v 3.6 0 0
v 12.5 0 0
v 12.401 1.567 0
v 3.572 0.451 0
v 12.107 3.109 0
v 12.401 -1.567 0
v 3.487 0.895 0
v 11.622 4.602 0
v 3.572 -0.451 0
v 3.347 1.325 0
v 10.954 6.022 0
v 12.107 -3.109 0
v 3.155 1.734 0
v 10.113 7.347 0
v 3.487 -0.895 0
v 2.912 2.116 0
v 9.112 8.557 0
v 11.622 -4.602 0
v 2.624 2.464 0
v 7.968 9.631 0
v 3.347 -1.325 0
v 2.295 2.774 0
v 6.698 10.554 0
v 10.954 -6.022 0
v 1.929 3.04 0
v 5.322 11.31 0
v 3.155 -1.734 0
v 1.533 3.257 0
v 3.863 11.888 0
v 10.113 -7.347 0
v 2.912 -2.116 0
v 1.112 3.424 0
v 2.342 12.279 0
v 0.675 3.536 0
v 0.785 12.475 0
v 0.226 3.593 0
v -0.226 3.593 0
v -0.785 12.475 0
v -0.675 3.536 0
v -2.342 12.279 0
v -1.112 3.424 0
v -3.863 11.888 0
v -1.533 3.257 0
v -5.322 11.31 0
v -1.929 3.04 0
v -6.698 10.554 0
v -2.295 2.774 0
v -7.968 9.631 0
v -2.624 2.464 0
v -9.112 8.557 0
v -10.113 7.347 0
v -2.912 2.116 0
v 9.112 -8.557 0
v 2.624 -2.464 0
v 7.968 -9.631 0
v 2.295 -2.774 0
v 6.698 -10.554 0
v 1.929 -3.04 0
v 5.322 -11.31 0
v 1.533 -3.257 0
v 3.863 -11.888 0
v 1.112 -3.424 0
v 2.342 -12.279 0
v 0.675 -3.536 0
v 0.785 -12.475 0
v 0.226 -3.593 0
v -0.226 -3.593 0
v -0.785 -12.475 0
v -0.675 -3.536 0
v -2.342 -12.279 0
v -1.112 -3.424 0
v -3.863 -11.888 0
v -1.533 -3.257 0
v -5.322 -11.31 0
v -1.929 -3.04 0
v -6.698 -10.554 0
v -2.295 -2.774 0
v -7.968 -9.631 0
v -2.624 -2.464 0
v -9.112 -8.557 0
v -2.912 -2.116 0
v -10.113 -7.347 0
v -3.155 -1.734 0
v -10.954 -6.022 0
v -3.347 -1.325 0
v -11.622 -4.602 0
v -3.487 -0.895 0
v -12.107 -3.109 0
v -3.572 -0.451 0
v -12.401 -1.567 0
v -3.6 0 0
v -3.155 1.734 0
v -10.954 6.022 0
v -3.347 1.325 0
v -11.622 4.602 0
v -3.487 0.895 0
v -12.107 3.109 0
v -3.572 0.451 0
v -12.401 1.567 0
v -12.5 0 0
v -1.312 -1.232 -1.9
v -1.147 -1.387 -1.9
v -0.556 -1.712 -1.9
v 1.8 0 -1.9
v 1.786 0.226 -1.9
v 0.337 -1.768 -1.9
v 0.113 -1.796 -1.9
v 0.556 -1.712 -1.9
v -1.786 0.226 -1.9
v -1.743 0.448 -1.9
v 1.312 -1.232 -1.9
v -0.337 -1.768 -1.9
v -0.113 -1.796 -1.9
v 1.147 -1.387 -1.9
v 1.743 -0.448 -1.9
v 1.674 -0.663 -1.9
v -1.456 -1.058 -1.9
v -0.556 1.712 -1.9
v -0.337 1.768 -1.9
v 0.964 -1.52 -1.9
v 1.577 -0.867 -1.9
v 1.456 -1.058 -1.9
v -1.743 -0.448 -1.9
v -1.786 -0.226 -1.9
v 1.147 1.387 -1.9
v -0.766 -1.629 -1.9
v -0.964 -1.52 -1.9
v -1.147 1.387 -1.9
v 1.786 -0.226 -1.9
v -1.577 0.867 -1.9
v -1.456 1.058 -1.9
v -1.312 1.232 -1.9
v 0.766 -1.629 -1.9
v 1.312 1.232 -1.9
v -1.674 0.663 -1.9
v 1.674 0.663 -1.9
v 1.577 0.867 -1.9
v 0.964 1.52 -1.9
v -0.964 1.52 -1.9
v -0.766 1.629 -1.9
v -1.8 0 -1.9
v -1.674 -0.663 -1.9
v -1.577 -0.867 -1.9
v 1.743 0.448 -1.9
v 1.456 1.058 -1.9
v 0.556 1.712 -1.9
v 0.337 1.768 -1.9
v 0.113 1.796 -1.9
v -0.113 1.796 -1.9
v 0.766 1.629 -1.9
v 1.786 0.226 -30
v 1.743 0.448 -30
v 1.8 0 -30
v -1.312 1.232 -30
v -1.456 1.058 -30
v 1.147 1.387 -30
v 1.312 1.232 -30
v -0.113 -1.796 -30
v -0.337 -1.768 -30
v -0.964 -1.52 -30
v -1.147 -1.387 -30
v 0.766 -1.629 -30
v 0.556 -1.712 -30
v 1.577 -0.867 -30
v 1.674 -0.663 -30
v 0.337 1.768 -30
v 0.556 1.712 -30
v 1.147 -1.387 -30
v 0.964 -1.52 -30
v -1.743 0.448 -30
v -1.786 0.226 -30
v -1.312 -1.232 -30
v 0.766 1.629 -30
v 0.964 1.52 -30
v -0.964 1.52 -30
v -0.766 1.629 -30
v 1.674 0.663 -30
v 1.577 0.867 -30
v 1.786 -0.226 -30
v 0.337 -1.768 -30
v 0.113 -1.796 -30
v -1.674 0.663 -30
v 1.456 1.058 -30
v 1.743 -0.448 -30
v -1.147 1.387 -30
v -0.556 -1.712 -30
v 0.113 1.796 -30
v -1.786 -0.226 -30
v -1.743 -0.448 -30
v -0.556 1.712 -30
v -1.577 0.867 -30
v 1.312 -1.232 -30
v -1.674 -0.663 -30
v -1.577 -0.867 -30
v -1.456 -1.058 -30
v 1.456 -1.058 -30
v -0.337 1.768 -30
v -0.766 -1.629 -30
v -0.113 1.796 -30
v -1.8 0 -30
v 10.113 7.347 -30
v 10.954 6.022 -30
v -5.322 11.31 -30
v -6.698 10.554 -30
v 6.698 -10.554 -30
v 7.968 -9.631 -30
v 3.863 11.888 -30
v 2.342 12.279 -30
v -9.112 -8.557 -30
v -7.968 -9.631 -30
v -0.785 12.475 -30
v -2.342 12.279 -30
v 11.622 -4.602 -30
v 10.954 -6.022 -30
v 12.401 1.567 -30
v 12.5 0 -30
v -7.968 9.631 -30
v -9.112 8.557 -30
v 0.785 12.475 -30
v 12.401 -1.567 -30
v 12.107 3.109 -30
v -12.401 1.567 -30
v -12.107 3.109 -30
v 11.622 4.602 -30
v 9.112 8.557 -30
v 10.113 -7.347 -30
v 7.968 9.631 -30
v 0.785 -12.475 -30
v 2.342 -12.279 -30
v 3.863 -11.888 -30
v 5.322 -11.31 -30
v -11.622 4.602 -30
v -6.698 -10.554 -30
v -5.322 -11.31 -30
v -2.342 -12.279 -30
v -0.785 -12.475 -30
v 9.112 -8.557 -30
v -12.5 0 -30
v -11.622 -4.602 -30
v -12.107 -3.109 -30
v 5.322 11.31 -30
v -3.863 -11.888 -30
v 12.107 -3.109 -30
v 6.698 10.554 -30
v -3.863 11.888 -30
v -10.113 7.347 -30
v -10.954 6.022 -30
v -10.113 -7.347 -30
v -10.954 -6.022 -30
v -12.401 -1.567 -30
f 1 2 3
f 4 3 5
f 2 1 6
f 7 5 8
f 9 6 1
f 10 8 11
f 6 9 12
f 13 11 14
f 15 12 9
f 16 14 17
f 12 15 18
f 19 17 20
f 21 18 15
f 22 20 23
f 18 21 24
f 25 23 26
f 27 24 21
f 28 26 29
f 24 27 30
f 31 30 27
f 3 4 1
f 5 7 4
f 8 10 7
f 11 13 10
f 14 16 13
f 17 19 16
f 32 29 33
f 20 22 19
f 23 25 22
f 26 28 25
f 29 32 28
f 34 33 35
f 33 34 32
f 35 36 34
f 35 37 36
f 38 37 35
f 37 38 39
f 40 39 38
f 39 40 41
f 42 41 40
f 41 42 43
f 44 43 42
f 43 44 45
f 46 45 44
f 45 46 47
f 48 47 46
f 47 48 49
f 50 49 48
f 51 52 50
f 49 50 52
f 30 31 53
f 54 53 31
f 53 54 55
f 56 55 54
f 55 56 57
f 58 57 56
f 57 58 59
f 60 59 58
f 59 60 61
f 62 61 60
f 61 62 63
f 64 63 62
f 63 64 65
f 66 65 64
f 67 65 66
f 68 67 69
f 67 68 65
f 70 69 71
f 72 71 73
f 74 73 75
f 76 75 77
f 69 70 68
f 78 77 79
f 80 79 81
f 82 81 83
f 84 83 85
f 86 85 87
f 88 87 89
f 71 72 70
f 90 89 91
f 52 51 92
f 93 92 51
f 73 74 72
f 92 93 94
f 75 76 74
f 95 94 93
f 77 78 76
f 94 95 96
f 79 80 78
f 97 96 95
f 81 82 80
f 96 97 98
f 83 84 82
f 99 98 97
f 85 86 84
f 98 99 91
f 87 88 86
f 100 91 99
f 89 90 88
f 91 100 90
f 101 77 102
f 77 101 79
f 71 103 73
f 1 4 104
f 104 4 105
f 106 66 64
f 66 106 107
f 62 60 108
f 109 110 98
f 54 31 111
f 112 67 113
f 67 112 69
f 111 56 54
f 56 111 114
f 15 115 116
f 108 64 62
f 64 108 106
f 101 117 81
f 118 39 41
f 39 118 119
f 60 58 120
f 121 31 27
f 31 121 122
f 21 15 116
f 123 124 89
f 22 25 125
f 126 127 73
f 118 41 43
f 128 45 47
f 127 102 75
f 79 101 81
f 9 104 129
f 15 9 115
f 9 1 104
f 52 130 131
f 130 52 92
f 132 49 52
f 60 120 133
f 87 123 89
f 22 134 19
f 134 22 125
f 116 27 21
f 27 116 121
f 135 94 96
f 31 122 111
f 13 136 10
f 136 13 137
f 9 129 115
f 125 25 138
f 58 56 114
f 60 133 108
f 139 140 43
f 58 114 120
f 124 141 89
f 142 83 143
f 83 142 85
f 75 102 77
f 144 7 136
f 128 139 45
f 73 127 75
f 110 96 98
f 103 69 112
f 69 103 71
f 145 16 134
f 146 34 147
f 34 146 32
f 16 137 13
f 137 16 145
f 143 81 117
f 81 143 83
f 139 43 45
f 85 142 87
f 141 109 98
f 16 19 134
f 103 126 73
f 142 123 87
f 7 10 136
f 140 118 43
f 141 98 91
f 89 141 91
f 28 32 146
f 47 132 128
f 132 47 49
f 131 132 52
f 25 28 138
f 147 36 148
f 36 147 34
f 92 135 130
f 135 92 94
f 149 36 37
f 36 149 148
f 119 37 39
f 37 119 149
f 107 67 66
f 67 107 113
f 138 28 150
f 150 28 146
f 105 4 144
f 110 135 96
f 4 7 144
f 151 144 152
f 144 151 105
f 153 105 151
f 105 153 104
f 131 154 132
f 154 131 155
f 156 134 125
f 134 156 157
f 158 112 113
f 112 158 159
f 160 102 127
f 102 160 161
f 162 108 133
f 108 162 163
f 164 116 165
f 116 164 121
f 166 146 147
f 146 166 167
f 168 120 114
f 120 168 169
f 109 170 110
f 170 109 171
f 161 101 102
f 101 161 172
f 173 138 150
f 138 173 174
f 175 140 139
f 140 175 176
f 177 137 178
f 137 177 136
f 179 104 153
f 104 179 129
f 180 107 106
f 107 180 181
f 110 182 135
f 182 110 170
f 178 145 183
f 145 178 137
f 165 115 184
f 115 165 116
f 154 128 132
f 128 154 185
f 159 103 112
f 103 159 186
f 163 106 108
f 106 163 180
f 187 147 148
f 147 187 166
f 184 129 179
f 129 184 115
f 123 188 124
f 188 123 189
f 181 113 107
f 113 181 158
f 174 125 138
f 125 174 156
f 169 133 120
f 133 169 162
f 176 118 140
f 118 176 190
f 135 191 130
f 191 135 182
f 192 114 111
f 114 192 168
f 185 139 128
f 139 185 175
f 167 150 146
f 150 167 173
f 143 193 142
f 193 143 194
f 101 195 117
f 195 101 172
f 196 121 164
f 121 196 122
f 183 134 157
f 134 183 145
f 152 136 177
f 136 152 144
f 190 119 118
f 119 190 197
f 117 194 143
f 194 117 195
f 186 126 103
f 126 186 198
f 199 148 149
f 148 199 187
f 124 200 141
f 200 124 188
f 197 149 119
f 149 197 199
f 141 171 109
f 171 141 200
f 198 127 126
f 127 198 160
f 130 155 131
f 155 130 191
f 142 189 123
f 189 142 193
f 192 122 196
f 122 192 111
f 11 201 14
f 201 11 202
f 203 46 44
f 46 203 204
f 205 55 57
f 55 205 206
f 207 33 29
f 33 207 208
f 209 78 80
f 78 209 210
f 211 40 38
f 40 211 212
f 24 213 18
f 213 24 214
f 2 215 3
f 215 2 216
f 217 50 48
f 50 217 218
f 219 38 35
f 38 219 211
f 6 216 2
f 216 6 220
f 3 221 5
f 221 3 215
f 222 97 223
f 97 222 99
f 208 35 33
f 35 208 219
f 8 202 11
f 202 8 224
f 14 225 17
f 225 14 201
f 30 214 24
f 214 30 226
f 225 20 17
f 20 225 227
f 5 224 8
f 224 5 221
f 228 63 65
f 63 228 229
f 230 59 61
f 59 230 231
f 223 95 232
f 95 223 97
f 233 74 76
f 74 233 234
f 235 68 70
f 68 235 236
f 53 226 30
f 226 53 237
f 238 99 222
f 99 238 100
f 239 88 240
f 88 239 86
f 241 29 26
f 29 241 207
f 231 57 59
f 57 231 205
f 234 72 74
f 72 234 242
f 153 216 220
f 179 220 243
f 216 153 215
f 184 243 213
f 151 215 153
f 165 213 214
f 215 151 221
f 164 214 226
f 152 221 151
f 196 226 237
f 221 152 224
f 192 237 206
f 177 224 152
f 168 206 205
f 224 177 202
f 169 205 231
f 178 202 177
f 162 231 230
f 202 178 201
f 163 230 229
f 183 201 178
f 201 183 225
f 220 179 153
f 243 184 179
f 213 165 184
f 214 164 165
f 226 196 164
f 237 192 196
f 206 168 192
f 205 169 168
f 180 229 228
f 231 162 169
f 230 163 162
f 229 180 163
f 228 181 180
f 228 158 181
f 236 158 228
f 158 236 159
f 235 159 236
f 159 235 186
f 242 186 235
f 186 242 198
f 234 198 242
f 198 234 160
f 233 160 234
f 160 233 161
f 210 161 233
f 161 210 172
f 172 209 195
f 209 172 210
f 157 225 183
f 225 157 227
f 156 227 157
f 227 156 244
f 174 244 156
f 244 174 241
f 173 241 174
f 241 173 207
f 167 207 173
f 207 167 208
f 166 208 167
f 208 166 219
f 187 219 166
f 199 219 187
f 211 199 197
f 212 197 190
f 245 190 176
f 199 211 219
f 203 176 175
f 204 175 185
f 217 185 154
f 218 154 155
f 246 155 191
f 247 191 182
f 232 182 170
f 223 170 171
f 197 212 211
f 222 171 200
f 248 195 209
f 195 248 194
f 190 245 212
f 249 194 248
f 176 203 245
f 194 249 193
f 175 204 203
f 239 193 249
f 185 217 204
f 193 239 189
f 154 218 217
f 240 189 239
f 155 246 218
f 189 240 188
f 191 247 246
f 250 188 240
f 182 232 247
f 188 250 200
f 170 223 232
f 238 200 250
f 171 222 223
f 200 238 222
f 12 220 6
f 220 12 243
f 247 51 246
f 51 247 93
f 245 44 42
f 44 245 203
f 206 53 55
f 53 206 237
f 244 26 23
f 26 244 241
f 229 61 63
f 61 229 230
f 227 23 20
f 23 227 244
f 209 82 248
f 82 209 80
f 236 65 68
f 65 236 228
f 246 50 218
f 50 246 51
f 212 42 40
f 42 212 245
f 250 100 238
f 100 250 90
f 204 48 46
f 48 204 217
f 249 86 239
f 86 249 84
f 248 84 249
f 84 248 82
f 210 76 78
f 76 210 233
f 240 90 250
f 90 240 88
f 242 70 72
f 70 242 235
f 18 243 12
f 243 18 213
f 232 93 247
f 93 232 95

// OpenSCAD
$fn = 50;


difference() {
	union() {
		translate(v = [0, 0, -30.0000000000]) {
			cylinder(h = 30, r = 12.5000000000);
		}
	}
	union() {
		translate(v = [0, 0, 0]) {
			rotate(a = [0, 0, 0]) {
				difference() {
					union() {
						translate(v = [0, 0, -33.0000000000]) {
							cylinder(h = 33, r = 1.5000000000);
						}
						translate(v = [0, 0, -1.9000000000]) {
							cylinder(h = 1.9000000000, r1 = 1.8000000000, r2 = 3.6000000000);
						}
						translate(v = [0, 0, -33.0000000000]) {
							cylinder(h = 33, r = 1.8000000000);
						}
						translate(v = [0, 0, -33.0000000000]) {
							cylinder(h = 33, r = 1.5000000000);
						}
					}
					union();
				}
			}
		}
	}
}
